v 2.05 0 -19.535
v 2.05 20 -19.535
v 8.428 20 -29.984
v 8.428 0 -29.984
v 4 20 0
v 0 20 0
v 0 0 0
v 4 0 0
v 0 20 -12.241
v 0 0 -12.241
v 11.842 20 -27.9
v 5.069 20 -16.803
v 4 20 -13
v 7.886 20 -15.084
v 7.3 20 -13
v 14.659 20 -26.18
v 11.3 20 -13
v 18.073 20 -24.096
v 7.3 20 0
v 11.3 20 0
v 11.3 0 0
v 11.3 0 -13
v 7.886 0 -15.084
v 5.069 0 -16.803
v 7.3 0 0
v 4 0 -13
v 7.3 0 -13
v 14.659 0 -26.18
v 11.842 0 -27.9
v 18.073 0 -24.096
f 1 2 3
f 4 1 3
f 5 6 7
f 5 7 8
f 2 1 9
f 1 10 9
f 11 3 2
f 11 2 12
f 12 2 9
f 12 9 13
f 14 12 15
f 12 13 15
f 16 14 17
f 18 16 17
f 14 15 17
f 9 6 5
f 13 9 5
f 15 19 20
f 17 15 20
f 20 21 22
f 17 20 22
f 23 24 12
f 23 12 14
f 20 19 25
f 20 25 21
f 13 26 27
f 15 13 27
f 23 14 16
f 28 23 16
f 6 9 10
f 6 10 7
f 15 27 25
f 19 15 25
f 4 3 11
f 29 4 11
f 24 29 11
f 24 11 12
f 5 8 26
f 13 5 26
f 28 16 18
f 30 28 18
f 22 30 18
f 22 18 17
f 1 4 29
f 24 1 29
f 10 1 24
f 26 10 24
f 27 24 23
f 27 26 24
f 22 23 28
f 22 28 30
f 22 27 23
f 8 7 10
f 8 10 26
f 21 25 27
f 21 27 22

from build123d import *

# Parameters (mm, degrees)
BOSS_EXTRUDE1_DEPTH = 20
CHAMFER1_START      = -5
CHAMFER1_OUTLINE_W  = 22
CHAMFER1_OUTLINE_H  = 11
CHAMFER1_DEPTH      = 1.687562561


with BuildPart() as part:
    # Sketch1 → Boss-Extrude1 (new body)
    with BuildSketch(Plane(origin=(0, 0, 0), x_dir=(1, 0, 0), z_dir=(0, 1, 0))):
        Polygon((0, 0), (4, 0), (4, 13), (7.3, 13), (7.3, 0), (11.3, 0), (11.3, 13), (0, 16.176286751), align=None)
    boss_extrude1 = extrude(amount=BOSS_EXTRUDE1_DEPTH)

    # Mirror1: Boss-Extrude1 across plane
    add(boss_extrude1.mirror(Plane(origin=(11.3, 20, -13), x_dir=(0.9626917464264807, 0, 0.2706004459758567), z_dir=(-0.2706004459758567, 0, 0.9626917464264807))))

    # Chamfer1: read off the stored shape, not the designer's step
    # Chamfer1 outline → Chamfer1 (cut)
    with BuildSketch(Plane(origin=(0, 0, 0), x_dir=(0, 1, 0), z_dir=(0.9626917464264807, 0, 0.2706004459758569)).offset(CHAMFER1_START)):
        with Locations((10, -15.5)):
            Rectangle(CHAMFER1_OUTLINE_W, CHAMFER1_OUTLINE_H)
    extrude(amount=CHAMFER1_DEPTH, mode=Mode.SUBTRACT)


solid = part.part
